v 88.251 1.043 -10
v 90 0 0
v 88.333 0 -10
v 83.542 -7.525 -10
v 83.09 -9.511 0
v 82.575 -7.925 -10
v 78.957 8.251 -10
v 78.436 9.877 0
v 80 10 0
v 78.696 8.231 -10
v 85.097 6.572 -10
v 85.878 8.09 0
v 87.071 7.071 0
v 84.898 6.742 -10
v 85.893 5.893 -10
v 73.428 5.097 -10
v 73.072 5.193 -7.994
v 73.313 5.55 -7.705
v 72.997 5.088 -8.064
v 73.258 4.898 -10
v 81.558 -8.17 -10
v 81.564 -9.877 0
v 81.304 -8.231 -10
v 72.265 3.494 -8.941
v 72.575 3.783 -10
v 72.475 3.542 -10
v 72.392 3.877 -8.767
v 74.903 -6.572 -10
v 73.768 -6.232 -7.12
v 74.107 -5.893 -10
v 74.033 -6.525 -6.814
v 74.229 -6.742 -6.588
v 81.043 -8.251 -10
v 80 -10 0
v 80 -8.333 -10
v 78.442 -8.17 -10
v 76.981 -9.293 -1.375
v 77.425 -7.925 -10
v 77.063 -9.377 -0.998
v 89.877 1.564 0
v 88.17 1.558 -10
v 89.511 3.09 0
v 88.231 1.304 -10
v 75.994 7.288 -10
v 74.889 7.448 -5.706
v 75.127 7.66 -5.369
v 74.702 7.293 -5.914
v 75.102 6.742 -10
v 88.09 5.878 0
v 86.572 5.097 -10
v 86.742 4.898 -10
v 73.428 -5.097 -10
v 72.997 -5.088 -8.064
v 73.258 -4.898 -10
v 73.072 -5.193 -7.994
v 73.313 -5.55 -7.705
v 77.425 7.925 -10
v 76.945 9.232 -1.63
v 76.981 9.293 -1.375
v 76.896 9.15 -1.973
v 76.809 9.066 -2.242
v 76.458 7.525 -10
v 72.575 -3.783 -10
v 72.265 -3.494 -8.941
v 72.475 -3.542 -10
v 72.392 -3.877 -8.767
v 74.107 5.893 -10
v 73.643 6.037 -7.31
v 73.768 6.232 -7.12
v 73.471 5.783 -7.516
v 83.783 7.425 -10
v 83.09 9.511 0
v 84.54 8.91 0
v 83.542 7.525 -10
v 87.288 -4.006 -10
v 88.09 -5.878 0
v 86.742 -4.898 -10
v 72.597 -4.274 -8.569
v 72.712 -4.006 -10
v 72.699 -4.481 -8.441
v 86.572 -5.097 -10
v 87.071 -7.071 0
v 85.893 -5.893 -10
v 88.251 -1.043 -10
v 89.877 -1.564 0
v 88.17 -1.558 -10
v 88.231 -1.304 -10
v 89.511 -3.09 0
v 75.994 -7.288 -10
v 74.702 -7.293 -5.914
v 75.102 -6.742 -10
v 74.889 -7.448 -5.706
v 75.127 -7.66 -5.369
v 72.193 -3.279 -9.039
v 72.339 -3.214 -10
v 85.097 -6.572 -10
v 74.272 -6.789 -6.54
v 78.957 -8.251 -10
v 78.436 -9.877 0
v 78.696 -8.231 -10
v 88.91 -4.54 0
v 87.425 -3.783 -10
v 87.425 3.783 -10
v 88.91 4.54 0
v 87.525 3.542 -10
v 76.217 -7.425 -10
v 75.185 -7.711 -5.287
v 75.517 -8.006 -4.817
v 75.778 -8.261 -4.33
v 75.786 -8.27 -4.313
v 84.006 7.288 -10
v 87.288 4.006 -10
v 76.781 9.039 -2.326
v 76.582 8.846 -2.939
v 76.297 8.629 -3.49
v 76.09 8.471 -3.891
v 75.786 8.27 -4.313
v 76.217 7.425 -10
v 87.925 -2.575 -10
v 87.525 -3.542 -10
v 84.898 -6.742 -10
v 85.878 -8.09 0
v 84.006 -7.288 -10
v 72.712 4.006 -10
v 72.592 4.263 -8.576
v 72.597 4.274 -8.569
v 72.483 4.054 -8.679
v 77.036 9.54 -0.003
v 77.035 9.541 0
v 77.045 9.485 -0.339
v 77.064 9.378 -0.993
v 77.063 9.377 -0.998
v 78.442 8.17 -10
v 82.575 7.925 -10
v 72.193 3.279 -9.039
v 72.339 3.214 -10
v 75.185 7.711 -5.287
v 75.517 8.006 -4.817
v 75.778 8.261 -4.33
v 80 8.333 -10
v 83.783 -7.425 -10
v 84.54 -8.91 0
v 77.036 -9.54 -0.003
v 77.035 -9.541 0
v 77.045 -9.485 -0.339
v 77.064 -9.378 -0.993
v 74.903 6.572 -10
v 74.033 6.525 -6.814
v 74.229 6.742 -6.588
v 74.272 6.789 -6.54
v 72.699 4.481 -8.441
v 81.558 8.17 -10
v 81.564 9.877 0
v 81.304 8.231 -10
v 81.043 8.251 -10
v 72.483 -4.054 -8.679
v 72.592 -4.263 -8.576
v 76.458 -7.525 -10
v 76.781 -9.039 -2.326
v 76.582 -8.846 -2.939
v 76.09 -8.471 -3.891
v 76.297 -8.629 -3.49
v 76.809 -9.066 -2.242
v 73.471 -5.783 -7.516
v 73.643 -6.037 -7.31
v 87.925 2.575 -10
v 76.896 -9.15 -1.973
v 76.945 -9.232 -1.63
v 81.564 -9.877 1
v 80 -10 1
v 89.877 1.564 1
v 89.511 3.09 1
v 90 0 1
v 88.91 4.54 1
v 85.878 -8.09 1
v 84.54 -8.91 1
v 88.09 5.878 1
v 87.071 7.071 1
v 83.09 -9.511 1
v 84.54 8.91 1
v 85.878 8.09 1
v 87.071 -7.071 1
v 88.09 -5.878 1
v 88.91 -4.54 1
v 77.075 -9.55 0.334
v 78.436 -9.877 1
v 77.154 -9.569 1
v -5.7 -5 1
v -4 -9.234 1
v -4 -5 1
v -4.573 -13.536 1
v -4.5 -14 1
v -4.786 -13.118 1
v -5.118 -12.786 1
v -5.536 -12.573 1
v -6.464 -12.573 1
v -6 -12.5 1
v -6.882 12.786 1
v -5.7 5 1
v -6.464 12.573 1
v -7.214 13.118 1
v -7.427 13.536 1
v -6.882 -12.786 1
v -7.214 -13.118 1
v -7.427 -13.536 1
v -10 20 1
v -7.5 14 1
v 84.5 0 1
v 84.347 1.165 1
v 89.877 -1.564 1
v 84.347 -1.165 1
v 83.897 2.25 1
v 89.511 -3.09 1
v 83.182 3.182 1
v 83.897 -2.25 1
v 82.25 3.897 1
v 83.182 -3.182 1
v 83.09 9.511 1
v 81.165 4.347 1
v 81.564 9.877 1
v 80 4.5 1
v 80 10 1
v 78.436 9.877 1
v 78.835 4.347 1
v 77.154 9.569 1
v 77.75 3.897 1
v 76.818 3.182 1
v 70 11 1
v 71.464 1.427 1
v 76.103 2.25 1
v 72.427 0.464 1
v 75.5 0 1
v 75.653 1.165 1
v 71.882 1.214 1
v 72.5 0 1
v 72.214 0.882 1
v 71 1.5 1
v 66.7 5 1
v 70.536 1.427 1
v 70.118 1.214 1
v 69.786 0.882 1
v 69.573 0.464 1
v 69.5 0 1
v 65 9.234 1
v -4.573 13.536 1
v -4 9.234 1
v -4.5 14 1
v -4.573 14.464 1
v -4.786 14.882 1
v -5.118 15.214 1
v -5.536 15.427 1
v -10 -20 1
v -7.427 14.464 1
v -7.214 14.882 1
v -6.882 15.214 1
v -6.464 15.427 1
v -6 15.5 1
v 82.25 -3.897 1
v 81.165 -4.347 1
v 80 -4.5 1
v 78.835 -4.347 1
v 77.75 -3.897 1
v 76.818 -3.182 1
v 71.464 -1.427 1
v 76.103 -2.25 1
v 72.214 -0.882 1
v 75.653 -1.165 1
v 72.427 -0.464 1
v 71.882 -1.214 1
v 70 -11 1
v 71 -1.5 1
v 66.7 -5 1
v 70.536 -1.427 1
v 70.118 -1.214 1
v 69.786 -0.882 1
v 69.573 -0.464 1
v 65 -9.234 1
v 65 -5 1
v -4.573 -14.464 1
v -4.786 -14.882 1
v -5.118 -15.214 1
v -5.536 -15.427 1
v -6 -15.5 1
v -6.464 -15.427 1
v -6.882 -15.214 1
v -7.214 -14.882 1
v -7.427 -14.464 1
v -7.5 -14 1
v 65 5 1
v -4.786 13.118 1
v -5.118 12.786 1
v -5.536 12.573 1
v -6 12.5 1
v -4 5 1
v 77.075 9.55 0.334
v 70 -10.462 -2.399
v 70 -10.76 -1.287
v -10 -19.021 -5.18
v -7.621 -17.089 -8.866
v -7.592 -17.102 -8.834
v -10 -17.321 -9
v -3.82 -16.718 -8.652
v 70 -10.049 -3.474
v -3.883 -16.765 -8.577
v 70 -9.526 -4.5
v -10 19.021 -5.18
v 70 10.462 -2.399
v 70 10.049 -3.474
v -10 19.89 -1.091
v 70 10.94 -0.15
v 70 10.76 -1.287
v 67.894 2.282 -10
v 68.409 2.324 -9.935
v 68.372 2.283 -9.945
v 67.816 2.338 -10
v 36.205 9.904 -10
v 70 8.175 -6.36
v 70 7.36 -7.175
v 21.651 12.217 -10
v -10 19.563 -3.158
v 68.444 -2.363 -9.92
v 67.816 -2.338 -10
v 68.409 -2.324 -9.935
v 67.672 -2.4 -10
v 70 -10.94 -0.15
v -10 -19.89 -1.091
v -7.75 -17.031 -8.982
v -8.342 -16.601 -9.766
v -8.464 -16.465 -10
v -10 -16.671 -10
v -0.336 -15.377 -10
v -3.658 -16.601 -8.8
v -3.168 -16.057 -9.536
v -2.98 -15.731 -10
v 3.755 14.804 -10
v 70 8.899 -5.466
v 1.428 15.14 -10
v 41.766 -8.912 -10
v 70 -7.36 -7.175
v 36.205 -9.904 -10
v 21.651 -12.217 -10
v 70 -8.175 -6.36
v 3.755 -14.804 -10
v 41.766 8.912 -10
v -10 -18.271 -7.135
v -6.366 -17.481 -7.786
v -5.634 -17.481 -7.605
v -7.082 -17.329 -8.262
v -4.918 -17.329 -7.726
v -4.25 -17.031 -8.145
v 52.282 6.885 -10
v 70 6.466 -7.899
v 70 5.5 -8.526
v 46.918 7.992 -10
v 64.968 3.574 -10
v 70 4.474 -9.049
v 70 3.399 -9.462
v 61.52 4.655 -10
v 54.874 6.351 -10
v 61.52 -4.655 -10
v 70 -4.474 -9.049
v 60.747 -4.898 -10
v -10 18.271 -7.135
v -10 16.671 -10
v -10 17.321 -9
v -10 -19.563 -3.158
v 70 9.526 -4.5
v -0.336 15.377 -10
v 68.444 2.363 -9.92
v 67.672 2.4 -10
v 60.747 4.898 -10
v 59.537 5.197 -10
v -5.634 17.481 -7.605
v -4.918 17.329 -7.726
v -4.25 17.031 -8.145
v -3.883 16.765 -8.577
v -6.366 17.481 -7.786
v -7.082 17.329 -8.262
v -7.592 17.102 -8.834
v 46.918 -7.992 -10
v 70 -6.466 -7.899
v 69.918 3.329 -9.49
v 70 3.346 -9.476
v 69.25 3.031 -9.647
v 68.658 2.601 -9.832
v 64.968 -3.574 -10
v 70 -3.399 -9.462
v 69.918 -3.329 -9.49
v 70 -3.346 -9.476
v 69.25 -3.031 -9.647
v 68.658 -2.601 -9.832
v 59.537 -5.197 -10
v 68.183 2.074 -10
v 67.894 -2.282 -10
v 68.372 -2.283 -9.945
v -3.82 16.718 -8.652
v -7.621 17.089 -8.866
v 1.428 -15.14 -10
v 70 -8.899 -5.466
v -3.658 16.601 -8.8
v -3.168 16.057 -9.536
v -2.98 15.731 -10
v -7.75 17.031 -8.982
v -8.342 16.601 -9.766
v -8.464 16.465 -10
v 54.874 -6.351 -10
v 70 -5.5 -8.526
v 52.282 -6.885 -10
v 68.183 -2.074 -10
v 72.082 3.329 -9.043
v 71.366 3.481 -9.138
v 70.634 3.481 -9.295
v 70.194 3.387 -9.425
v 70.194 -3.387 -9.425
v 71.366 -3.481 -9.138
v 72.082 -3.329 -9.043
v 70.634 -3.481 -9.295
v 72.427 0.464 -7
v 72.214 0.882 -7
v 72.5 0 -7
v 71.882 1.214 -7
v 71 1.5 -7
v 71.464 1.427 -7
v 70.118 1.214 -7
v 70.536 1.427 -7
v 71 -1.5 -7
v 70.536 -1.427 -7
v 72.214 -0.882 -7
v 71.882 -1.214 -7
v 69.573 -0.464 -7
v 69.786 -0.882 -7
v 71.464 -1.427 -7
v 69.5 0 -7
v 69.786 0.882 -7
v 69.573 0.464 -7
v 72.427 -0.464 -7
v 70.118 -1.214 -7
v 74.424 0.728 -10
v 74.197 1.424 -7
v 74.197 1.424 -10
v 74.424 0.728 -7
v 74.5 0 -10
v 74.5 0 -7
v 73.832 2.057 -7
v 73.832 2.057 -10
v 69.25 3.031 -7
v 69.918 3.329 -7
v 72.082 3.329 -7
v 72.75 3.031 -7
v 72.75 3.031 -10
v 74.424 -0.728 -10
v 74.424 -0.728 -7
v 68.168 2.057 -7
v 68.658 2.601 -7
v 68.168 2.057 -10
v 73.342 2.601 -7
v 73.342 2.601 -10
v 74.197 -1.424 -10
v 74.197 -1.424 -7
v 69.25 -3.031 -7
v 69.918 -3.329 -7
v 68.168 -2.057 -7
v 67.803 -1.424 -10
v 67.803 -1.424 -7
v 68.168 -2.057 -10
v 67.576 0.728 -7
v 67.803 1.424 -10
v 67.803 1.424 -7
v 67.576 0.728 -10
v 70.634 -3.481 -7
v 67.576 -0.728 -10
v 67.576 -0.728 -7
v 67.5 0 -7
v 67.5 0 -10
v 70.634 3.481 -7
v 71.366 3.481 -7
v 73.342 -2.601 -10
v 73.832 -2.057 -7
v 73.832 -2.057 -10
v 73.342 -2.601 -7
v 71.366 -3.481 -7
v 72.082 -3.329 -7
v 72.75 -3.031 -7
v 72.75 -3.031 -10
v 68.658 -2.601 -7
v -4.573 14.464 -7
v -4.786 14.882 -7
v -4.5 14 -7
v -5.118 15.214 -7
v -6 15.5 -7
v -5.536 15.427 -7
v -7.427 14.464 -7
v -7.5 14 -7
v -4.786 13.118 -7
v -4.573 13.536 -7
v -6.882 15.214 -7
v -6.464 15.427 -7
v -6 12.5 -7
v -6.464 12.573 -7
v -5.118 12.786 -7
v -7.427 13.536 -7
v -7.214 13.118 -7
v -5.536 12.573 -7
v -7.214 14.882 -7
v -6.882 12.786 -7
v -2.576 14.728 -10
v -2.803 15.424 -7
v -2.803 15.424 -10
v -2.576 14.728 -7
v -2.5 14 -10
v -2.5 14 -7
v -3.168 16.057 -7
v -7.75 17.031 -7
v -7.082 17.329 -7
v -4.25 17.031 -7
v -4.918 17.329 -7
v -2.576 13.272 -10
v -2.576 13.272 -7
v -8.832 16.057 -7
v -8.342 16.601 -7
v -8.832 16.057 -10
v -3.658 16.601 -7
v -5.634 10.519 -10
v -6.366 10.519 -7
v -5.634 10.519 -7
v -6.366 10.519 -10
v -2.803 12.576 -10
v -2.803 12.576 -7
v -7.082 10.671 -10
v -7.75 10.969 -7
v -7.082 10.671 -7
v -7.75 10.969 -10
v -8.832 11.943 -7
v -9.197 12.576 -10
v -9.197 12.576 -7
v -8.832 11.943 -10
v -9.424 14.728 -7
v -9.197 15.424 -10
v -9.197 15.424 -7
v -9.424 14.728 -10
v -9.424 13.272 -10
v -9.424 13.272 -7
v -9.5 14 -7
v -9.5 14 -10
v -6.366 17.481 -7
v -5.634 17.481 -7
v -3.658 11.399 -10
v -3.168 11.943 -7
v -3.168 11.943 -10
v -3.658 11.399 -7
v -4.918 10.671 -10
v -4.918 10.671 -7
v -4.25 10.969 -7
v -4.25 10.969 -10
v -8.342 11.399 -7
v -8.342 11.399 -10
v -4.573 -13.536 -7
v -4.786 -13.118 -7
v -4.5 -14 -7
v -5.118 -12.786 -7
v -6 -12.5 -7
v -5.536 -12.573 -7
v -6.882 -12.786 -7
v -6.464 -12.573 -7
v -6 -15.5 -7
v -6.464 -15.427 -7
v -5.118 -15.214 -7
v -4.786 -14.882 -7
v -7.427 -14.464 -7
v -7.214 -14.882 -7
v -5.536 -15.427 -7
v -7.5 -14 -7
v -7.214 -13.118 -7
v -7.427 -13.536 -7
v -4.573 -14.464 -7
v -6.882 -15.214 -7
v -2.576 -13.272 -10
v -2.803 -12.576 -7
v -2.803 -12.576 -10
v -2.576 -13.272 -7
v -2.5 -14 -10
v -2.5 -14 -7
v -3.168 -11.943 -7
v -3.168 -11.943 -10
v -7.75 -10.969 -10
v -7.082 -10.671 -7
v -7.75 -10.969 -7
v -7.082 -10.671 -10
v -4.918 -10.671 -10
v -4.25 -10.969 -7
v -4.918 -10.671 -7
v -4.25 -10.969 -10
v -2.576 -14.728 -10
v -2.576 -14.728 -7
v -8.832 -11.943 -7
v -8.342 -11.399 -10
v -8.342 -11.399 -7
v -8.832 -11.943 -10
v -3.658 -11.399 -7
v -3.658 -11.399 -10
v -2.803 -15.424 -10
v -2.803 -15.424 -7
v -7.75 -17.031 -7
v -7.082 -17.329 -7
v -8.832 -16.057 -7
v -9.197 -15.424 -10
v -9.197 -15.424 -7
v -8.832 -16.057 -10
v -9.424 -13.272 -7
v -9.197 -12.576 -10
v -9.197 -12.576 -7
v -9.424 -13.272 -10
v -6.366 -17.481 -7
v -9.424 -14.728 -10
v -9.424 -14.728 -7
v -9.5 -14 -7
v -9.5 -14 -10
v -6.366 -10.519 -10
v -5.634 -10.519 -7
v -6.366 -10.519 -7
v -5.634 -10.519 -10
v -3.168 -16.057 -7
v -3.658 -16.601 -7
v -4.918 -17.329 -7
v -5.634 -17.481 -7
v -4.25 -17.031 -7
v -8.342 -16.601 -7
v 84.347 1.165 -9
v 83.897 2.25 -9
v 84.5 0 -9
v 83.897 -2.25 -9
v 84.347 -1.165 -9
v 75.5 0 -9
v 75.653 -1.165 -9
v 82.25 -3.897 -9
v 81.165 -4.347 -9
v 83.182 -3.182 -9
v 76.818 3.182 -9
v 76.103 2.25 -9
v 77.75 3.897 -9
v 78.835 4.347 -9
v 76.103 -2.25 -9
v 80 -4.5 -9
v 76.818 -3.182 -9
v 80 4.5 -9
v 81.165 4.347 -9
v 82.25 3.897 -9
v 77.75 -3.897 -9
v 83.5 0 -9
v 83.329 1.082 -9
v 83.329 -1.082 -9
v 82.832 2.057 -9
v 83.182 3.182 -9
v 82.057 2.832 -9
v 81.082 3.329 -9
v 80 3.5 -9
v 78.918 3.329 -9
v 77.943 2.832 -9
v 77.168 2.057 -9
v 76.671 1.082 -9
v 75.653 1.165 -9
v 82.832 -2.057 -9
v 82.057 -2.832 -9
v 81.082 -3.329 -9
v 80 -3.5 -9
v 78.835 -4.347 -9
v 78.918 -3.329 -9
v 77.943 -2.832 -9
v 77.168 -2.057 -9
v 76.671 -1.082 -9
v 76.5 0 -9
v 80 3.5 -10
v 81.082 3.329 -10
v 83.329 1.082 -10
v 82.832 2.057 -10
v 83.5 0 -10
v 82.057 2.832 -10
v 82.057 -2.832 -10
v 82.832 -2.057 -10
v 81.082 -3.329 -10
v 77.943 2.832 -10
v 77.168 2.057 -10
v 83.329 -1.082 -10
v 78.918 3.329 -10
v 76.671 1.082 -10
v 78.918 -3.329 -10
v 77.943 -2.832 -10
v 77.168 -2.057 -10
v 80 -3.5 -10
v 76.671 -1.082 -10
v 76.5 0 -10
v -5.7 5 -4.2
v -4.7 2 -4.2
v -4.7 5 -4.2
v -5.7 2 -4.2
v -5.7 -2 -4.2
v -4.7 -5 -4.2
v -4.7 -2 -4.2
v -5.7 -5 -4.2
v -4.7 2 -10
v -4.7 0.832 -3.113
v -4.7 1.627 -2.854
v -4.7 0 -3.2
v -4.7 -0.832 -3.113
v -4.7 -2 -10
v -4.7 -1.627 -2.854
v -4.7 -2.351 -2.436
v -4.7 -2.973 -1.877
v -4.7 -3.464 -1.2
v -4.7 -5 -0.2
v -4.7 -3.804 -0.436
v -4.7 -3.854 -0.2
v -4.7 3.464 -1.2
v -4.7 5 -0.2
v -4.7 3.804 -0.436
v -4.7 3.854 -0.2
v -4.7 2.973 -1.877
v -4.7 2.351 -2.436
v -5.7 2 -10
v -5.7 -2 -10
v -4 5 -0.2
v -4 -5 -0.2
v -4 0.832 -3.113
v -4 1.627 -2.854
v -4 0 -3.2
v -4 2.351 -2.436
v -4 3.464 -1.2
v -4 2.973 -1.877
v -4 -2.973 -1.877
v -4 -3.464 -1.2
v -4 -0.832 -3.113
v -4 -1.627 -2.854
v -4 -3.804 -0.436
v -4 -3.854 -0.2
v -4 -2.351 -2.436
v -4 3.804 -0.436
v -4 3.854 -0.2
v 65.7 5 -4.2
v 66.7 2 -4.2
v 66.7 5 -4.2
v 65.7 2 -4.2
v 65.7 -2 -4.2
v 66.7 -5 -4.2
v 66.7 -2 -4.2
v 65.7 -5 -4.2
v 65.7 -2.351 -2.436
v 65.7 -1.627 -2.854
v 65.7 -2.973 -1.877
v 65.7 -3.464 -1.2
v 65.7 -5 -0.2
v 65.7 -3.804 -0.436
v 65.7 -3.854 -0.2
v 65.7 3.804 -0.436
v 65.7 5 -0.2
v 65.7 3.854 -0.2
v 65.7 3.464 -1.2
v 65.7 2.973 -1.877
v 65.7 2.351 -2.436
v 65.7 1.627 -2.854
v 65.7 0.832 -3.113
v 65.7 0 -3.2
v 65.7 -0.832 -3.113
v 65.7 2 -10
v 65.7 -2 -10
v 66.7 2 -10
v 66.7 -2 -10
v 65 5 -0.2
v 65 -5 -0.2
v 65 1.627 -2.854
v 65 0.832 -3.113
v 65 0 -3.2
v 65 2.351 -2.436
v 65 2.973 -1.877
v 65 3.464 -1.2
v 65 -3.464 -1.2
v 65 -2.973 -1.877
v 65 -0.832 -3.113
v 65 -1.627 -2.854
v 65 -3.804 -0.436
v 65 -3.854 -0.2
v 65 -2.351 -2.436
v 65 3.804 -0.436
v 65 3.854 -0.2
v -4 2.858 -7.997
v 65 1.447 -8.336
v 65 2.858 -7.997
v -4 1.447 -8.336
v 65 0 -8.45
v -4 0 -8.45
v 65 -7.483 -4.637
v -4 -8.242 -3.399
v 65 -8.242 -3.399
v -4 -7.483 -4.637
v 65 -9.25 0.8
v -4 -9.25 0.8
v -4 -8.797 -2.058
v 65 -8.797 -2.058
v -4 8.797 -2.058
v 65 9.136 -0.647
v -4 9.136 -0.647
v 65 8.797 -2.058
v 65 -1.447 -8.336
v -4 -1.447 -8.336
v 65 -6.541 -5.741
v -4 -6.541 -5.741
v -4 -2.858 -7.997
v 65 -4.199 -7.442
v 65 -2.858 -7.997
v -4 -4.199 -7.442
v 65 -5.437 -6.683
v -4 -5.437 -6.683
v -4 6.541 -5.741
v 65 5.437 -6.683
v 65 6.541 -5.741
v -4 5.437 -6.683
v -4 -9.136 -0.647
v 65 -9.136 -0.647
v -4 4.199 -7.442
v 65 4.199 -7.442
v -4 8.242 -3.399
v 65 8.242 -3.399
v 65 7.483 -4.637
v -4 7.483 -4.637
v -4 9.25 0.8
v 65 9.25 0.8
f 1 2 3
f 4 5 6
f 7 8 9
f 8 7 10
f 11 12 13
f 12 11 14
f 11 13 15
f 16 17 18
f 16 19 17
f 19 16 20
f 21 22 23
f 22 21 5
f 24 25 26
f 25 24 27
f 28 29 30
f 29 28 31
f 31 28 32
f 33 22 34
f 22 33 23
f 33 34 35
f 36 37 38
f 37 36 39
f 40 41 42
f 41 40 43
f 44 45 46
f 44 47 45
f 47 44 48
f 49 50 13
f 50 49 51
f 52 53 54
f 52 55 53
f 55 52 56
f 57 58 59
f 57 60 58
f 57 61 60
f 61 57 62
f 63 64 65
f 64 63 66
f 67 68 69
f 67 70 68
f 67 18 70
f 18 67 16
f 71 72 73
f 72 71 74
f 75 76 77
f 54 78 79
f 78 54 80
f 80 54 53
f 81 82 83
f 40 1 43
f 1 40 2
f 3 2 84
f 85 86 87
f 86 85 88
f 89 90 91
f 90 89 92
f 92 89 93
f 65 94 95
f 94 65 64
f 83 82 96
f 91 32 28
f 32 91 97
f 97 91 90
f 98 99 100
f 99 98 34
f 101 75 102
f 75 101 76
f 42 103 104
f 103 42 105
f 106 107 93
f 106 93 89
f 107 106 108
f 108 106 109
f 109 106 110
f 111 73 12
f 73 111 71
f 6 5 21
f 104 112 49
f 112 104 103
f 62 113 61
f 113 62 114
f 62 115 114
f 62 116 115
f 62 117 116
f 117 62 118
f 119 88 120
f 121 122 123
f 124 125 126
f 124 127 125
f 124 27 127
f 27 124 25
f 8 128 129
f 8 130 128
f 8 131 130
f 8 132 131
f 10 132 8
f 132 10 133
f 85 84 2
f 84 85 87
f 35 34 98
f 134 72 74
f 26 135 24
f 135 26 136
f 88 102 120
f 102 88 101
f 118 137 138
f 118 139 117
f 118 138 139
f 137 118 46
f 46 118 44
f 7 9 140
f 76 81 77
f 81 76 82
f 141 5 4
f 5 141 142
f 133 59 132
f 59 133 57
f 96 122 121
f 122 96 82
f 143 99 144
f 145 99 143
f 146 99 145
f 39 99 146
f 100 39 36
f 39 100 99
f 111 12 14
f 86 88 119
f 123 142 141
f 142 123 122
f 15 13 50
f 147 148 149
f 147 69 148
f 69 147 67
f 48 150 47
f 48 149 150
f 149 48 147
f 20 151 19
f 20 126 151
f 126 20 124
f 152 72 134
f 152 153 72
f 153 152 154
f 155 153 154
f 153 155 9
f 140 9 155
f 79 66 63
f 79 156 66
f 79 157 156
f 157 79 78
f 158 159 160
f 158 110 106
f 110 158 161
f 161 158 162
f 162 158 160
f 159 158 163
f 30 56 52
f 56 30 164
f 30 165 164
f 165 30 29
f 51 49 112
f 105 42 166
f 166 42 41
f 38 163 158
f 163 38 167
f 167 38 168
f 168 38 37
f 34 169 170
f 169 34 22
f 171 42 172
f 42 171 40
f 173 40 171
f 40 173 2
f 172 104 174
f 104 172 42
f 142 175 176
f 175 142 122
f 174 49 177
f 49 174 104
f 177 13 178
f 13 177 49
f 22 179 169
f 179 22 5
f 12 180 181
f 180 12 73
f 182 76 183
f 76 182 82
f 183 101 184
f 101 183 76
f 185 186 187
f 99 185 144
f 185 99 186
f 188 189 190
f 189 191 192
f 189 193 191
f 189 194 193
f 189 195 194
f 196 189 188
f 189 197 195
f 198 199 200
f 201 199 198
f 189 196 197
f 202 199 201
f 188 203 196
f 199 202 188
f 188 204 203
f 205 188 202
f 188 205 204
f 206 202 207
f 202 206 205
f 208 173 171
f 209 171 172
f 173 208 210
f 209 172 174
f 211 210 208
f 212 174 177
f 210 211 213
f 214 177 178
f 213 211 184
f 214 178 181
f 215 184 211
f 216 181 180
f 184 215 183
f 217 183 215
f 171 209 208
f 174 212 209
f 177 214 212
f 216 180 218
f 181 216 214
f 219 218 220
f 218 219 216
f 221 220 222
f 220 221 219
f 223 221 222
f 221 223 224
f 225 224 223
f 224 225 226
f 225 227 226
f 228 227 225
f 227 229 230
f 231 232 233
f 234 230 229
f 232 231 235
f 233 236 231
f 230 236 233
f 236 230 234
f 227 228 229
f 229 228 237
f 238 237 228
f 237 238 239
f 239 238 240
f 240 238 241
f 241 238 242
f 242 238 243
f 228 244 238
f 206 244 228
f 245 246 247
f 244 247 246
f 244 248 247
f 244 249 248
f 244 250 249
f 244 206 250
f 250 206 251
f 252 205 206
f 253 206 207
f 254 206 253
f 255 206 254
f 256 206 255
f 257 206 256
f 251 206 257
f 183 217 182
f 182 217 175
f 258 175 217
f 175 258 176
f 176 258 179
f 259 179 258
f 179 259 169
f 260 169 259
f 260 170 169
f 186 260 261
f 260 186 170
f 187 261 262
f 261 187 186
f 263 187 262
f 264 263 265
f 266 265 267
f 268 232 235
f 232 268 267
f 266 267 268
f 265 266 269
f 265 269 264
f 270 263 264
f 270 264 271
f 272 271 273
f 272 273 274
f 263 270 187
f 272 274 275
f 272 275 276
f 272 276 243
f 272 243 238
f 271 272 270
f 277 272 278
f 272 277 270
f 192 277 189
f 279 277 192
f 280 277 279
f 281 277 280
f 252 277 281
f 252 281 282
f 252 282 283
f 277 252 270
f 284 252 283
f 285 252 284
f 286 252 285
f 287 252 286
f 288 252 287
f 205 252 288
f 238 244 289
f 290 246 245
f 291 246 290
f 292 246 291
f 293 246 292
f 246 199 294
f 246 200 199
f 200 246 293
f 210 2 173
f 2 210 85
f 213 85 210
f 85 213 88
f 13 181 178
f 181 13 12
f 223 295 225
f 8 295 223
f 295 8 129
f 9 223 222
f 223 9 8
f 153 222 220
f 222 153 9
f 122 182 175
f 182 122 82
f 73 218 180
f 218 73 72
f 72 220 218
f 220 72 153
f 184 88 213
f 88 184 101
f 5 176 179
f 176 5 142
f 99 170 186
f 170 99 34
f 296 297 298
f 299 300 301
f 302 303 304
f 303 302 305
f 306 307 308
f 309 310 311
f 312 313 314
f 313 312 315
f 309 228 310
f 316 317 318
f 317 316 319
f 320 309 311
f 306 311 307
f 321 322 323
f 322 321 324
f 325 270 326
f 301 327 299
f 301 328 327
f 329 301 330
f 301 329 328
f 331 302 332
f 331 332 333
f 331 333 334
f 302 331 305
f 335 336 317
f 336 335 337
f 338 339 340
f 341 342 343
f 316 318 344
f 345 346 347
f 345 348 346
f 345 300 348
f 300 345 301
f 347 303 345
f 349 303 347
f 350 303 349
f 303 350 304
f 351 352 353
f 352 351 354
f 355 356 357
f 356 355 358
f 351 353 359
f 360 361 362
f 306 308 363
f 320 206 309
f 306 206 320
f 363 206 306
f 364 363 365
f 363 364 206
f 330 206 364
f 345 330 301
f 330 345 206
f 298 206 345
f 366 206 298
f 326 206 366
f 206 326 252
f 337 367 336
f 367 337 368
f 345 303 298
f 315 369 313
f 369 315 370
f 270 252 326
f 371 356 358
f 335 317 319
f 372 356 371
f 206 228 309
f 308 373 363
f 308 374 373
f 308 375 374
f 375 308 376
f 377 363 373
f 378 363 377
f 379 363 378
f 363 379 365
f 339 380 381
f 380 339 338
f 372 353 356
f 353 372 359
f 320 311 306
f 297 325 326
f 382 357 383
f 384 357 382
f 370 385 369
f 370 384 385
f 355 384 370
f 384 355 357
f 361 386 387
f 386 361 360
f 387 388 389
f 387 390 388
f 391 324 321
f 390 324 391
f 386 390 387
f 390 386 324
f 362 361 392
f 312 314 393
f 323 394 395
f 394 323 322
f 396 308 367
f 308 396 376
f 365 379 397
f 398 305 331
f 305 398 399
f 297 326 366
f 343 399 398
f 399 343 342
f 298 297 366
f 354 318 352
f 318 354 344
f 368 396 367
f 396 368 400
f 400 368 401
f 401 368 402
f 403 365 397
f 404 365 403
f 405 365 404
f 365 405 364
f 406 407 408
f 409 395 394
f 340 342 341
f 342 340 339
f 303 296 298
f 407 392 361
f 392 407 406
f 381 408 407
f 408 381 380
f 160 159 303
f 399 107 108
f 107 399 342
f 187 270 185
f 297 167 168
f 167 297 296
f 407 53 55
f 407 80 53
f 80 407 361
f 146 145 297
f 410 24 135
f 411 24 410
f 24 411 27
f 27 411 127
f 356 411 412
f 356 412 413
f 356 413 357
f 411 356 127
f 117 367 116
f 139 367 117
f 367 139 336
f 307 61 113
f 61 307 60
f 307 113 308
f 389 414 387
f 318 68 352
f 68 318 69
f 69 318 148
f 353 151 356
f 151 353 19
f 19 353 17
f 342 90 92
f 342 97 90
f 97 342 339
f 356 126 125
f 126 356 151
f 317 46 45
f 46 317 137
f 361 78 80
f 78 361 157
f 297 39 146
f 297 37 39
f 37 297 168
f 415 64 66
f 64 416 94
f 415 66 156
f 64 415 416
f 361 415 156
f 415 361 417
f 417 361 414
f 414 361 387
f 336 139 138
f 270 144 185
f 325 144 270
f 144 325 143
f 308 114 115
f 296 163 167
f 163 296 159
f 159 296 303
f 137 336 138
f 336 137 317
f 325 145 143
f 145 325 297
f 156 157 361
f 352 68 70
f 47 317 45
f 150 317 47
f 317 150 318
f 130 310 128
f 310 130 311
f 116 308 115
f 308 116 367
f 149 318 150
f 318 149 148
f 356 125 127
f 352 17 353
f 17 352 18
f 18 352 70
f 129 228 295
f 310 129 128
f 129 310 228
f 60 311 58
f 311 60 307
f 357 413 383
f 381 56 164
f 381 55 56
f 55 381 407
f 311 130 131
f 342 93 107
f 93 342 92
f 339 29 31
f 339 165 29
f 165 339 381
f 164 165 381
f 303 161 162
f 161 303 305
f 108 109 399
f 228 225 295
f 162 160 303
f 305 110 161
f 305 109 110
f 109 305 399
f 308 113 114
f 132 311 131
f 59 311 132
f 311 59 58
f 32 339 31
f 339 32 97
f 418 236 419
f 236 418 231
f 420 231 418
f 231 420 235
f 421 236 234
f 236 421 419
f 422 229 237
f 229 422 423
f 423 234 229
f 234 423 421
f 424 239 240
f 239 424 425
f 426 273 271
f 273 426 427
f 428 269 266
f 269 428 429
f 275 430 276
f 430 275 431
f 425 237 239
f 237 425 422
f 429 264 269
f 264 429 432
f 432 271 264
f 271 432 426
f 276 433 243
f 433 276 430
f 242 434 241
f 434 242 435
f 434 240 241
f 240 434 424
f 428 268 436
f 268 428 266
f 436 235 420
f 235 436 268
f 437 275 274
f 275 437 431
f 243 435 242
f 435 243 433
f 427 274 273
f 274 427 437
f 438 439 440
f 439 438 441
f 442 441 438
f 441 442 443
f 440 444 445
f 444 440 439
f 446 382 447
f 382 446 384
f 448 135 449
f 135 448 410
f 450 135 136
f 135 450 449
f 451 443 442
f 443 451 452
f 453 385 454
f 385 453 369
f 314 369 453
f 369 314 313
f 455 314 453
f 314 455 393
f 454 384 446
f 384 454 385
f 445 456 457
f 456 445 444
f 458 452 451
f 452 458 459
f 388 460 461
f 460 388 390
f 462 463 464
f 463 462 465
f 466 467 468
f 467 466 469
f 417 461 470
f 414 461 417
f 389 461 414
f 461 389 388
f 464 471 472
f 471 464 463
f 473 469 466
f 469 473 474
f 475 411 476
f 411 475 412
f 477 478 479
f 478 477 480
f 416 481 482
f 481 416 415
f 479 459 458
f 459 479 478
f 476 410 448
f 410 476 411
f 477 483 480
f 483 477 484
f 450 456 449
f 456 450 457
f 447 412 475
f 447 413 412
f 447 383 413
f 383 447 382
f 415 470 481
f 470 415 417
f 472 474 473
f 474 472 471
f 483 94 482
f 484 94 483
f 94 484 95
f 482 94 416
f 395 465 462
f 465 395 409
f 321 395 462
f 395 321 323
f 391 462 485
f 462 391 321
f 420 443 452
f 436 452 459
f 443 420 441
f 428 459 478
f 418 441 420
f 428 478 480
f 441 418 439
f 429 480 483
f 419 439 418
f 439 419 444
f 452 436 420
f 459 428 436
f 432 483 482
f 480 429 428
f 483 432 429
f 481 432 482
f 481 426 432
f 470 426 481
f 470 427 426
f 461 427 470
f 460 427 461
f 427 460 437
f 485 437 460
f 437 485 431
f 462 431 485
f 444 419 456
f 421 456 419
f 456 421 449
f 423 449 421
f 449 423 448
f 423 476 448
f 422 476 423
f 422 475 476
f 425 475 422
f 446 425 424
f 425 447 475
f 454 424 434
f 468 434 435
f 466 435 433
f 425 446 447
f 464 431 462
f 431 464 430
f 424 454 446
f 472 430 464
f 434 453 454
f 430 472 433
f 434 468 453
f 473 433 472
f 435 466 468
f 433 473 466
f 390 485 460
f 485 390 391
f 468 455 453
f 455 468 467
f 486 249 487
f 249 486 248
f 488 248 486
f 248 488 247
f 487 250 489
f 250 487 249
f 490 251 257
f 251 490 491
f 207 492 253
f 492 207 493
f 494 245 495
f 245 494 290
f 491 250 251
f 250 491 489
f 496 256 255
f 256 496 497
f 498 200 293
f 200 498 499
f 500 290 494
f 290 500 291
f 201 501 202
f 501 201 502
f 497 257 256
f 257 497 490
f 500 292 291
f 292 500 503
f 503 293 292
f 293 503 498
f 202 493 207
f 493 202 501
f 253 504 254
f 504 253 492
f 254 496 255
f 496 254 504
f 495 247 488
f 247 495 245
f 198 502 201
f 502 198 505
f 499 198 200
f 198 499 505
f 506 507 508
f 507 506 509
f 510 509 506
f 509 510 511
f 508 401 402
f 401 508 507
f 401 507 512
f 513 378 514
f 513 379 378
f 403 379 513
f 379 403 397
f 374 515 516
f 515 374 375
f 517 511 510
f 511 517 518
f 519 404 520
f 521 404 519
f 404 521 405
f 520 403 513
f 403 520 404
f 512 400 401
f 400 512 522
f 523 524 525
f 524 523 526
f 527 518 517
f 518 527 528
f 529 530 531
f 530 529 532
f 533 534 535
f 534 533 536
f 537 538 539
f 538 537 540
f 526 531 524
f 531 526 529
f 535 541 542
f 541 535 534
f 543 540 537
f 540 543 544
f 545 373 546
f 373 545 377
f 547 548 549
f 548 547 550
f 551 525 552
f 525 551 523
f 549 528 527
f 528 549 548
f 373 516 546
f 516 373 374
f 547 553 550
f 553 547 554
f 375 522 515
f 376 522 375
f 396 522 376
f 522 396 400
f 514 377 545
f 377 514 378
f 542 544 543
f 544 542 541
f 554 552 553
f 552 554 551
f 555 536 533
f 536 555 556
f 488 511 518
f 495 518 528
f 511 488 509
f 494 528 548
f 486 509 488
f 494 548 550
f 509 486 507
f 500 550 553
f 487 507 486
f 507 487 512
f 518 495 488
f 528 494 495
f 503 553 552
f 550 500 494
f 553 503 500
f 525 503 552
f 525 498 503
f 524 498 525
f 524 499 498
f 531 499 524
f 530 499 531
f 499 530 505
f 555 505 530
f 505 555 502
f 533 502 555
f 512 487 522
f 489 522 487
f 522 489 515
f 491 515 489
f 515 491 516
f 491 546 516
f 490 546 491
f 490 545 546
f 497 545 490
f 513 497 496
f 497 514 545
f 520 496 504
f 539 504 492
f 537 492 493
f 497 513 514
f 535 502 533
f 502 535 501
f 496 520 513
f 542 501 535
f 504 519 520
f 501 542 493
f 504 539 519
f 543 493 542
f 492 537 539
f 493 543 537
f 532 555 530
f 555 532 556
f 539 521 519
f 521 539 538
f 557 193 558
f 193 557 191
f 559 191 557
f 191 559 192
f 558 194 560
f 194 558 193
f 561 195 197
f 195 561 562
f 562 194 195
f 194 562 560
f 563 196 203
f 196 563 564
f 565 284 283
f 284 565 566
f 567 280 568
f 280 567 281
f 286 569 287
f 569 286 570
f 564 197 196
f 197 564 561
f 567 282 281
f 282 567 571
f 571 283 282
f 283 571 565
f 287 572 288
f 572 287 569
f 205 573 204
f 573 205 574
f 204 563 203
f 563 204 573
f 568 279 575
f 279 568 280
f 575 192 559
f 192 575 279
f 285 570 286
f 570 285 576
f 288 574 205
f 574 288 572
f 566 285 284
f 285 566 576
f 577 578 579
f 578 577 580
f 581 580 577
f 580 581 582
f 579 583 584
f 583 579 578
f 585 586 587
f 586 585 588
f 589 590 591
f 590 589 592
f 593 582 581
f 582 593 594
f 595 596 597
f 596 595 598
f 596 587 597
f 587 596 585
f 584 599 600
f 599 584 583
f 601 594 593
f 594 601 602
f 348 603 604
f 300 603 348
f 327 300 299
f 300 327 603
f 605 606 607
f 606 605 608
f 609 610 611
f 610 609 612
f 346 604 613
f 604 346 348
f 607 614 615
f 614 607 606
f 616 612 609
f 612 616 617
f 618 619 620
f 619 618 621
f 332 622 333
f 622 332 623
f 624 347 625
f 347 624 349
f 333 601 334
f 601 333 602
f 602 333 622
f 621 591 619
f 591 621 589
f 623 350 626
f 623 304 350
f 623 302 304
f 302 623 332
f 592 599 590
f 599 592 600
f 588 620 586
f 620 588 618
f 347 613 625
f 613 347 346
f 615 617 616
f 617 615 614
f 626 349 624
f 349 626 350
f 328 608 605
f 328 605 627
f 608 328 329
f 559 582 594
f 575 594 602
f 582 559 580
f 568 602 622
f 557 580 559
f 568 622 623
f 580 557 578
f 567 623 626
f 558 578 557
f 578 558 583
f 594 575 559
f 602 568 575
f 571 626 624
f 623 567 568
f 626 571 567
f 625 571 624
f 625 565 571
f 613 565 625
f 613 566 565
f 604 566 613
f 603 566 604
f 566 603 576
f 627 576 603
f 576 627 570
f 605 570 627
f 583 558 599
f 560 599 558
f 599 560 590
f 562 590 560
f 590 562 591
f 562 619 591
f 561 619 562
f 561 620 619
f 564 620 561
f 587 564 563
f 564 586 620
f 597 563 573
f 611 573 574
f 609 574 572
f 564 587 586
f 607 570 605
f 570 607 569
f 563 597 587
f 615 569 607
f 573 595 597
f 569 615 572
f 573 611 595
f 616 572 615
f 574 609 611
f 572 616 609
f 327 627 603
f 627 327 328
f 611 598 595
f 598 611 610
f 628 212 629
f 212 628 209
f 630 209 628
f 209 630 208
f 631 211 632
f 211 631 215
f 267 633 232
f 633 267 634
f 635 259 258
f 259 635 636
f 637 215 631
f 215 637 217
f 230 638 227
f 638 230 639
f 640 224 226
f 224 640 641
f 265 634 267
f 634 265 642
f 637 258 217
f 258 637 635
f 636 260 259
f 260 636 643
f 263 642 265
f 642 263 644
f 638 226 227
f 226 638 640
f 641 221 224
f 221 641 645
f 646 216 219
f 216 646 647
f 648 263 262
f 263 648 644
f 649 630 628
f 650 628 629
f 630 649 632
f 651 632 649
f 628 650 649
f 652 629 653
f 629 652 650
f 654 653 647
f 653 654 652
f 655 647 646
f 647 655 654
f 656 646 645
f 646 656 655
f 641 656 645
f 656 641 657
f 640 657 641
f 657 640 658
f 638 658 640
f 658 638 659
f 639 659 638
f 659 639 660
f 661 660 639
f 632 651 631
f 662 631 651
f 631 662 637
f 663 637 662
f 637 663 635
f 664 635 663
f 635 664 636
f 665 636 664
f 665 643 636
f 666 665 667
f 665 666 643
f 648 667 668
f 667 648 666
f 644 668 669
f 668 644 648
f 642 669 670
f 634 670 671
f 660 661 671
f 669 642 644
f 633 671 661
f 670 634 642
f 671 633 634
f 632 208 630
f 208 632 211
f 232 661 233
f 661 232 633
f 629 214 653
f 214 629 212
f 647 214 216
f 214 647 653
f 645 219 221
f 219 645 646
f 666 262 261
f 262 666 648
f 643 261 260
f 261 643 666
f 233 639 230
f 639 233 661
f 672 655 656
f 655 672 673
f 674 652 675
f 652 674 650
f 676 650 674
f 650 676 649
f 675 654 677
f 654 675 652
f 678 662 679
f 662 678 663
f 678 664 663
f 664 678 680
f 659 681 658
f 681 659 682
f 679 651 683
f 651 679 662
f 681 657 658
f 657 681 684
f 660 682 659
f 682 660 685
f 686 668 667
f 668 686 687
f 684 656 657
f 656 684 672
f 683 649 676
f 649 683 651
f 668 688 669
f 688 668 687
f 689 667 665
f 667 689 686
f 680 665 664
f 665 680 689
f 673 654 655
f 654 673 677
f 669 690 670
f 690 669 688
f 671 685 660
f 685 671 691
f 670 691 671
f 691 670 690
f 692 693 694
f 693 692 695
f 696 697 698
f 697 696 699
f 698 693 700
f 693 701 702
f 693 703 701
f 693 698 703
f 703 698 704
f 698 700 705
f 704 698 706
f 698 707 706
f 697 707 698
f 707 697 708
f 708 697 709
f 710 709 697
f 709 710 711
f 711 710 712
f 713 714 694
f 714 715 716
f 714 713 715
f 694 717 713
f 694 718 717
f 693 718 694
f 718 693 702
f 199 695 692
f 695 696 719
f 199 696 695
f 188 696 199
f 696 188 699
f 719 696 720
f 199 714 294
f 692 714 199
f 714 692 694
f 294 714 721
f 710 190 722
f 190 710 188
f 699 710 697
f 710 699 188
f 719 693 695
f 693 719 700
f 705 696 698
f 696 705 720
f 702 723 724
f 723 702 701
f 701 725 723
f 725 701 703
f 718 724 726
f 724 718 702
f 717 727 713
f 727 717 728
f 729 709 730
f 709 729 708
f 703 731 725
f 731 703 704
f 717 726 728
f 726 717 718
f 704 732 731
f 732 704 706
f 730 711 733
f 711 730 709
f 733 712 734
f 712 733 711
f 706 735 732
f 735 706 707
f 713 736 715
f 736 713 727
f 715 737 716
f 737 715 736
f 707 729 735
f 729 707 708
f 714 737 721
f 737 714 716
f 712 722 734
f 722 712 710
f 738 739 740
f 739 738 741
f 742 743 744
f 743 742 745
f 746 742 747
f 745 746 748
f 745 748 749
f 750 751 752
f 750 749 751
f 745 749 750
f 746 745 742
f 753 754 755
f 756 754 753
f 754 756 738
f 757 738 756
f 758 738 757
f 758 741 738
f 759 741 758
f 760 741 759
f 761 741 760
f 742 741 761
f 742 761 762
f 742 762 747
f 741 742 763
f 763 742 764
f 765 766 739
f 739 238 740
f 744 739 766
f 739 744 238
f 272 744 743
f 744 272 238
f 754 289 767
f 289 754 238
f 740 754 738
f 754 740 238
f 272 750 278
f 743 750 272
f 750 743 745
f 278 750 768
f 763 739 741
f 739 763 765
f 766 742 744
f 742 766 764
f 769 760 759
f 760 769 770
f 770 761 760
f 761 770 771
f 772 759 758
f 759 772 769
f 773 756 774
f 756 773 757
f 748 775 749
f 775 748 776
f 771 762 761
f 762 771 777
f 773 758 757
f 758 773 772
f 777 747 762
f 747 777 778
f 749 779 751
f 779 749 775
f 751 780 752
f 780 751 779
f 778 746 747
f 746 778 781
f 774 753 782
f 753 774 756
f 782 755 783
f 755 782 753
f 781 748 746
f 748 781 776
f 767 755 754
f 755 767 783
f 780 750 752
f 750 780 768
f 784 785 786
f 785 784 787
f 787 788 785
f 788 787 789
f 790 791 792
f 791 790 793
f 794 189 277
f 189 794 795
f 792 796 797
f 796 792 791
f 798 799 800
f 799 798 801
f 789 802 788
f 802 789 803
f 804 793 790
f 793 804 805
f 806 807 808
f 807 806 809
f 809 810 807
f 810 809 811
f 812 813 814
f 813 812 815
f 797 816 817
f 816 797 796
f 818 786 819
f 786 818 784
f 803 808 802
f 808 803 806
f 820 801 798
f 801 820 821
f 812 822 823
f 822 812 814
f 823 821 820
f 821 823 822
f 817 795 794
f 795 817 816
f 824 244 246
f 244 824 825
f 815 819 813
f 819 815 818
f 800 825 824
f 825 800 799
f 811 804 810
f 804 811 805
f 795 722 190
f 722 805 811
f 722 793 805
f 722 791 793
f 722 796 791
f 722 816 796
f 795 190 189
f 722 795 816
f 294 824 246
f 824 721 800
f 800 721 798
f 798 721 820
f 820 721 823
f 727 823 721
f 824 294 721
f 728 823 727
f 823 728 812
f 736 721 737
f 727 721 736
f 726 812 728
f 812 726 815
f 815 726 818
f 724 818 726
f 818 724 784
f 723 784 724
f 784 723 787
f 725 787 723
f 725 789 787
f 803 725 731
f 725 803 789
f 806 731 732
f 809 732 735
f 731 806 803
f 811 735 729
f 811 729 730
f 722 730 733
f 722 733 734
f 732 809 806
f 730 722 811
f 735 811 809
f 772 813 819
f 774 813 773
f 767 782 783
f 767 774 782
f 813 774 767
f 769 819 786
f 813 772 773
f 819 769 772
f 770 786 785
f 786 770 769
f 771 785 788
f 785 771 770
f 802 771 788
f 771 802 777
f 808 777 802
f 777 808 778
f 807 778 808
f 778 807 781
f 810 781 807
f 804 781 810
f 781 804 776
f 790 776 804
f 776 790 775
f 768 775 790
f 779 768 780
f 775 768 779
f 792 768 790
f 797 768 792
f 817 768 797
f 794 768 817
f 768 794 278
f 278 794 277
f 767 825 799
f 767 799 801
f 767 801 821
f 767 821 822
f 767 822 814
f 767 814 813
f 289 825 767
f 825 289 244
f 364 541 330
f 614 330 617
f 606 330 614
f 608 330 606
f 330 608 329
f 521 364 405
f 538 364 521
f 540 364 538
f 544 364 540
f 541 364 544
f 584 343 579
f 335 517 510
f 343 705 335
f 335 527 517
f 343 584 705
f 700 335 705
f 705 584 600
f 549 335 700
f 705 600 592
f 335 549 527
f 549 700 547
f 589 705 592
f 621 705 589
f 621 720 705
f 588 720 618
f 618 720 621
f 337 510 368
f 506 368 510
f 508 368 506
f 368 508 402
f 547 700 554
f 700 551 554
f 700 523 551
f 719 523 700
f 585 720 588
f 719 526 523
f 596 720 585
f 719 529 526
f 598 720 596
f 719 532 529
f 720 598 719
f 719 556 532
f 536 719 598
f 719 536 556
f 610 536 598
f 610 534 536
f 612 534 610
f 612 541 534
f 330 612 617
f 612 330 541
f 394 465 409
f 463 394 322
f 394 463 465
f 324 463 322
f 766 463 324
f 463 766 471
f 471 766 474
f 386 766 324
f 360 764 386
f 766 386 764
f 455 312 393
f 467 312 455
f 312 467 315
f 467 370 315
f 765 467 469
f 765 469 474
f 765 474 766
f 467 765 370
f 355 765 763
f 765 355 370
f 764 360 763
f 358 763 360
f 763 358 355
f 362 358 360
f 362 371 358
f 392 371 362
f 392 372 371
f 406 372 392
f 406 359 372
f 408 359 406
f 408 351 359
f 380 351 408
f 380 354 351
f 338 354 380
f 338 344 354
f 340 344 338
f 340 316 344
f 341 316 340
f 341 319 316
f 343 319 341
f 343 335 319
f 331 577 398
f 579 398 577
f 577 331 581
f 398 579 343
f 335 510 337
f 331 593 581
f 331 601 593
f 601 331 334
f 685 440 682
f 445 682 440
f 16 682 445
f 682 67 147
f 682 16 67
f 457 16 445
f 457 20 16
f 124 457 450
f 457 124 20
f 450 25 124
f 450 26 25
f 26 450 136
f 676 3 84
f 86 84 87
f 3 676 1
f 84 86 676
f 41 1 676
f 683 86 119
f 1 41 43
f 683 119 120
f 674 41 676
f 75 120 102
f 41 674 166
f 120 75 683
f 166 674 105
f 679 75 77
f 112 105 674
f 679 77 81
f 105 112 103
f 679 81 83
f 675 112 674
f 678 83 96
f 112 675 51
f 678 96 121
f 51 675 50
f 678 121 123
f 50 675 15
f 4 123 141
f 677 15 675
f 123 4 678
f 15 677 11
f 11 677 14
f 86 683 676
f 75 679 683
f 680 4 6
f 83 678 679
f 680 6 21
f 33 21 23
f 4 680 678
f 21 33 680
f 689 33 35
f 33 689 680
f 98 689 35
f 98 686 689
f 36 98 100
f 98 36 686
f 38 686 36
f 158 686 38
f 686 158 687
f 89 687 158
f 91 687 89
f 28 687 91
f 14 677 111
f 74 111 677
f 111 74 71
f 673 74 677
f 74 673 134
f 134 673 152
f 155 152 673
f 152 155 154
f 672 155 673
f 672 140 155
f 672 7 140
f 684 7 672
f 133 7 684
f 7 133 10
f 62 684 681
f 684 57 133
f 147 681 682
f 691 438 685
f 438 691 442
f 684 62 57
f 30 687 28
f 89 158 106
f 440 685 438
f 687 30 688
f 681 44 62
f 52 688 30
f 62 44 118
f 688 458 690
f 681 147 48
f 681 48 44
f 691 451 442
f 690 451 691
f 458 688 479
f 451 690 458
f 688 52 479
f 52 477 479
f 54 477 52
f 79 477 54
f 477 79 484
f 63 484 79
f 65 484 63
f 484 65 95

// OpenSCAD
//mirror([0,0,1])
//rotate([0,0,45])
//for(m=[0,1]) mirror([m,0]) translate([1,0]) arm(m);
rotate([0,90]) arm(1);
//half();
//translate([0,0,22]) mirror([0,0,1]) half(1);
module half(top=0)
{
    for(r=[0:90:359])
      rotate([0,0,r]) translate([20,0,10]) rotate([0,90,0])
        arm(top);
}

module arm(top=0) {
  intersection() {
    translate([-1,-25,-10]) cube([11,50,100]);
  difference() {
    union() {
      translate([0,0,80]) rotate([0,-90,0]) intersection() { 
        union() {
        translate([0,0,-12]) cylinder(d1=16,d2=20,h=12,$fn=40);
          cylinder(d=20,h=1,$fn=40);
        }
        *sphere(d=24,$fn=40);
      }
      intersection(){
        translate([-1,-30,-10]) cube([20,60,90]);
        translate([-1,0,-10]) union() {
          cylinder(d1=40,d2=22,h=80,$fn=60);
          translate([0,0,80]) cylinder(d1=22,d2=18,h=10,$fn=60);
        }
      }
      *translate([0,0,-20]) rotate([0,90]) cylinder(d=80,h=10,$fn=100);
    }
    rotate([0,-90]) {
      translate([80,0,-9]) cylinder(d=9,h=20,$fn=24);
      translate([80,0,-20]) cylinder(d=7,h=20,$fn=20);
      translate([0,0,-16]) for(pos=[[71,0],[-6,14],[-6,-14]]) translate(pos) {
        cylinder(d=3,h=30,$fn=20);
        if(!top)
          rotate([0,0,0]) cylinder(d=7.8,h=8,$fn=4);
        else cylinder(d=7,h=9,$fn=30);
      }
    }
    translate([-0.8,0,-4]) battery(top=top);
  }
}
}

module battery(type="18650",neg=1,top=0)
{
  noff=neg?4:0;
  if(type=="18650") {
    cylinder(d=18+(neg?0.5:0),h=65+noff,$fn=40);
    if(neg)
    {
      for(m=[0,1]) translate([0,0,m?65+noff:0]) mirror([0,0,m]) {
        translate([-5,-5,-1.7]) cube([10,10,1]);
        if(top)
          translate([0,-2,-1.7]) cube([11.02,4,1]);
        translate([0,0,-.71]) cylinder(d=8,h=2.02,$fn=30);
        translate([-1,-5,-1.2]) cube([2,10,2]);
      }
    } else
    translate([0,0,64.99+noff]) cylinder(d=6,h=1.4,$fn=20);
  }
}
